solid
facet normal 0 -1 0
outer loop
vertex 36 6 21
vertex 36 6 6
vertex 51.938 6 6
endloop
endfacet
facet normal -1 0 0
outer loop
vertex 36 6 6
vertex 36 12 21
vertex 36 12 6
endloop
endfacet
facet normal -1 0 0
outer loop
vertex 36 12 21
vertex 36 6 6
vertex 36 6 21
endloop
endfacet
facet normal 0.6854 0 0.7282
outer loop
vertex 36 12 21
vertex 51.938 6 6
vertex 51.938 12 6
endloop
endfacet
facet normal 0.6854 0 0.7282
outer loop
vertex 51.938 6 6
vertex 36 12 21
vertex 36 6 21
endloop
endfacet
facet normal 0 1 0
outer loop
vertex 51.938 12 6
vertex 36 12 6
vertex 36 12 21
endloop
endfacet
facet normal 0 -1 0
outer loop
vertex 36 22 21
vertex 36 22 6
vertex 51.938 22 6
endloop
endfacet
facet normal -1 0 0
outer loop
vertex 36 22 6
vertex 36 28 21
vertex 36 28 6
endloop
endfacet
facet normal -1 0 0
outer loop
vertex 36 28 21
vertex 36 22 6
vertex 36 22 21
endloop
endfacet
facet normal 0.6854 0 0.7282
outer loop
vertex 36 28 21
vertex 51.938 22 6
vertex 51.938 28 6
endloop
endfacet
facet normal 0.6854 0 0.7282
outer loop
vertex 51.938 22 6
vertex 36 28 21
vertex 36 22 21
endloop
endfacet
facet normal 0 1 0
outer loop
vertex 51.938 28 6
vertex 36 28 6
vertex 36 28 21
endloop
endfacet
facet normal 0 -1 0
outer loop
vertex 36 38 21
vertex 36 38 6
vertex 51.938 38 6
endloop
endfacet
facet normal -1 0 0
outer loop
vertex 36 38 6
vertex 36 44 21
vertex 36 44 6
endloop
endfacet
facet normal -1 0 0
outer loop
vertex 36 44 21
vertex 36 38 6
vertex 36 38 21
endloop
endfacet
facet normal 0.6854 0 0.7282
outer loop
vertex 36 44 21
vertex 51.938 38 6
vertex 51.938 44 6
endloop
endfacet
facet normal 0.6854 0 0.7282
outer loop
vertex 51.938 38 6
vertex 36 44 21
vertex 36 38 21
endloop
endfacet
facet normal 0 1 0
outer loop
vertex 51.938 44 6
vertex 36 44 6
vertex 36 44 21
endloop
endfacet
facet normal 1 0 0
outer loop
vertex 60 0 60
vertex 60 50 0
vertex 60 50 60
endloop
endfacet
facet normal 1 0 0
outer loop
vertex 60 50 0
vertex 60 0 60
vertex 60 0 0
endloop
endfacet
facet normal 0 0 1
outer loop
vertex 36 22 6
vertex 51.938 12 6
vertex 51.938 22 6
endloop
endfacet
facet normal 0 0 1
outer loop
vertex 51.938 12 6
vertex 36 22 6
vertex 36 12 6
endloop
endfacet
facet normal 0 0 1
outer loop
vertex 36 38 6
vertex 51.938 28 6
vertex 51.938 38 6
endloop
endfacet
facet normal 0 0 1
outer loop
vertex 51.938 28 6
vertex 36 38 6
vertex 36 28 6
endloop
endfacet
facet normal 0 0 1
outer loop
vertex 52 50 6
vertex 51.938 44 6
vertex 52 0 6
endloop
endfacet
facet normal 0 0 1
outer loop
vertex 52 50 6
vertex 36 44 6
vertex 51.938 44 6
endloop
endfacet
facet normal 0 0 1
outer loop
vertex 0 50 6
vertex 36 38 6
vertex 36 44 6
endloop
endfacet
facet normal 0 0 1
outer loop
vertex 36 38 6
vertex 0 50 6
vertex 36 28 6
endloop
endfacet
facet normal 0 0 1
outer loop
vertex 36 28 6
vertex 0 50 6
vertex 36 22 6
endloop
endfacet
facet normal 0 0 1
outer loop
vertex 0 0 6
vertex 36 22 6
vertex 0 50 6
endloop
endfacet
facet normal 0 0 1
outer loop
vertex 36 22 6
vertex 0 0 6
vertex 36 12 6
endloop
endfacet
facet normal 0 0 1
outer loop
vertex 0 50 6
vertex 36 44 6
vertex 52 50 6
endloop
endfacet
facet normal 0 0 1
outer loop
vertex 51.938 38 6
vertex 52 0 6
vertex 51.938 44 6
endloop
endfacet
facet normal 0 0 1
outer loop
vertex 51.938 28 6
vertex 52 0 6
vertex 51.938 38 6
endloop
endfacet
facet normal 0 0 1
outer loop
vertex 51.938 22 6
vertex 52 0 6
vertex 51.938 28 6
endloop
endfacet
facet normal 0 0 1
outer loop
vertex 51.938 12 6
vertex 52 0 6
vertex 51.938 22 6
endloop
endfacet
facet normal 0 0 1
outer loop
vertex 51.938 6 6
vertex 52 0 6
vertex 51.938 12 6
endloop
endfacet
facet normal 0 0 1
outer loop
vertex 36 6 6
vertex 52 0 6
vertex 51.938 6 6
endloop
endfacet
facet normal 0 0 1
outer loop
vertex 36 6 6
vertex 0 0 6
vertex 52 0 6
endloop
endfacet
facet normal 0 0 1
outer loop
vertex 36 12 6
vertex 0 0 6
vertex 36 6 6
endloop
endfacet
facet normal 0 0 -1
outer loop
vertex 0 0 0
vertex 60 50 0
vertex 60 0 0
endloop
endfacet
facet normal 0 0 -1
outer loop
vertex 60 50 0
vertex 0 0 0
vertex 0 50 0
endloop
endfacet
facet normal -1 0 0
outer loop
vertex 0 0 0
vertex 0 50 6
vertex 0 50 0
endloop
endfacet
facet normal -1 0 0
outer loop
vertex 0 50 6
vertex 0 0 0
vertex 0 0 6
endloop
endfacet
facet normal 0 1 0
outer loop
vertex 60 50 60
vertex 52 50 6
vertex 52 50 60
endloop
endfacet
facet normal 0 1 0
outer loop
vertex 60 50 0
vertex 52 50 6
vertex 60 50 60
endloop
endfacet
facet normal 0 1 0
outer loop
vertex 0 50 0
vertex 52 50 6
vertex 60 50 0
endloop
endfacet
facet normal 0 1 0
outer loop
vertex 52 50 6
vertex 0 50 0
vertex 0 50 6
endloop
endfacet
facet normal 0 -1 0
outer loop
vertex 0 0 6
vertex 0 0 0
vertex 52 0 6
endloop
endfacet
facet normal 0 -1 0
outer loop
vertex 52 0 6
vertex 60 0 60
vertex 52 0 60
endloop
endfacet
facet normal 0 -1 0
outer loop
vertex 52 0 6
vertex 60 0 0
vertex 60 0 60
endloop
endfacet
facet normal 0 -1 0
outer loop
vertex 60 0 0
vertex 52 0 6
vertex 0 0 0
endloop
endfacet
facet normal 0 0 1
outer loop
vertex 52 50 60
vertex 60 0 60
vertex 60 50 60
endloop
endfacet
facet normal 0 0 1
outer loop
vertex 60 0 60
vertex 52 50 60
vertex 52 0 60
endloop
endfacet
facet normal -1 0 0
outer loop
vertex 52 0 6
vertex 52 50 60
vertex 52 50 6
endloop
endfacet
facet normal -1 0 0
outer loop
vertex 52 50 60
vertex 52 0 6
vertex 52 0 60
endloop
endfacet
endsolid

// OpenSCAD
$fn = 32;

// ----------------------------------------------------------------------
// Rib bracket: 3-gusset L bracket
// ----------------------------------------------------------------------

// --- parameters (mm) ---
base_l = 60;              // foot length, X
base_w = 50;              // foot width, Y
base_t = 6;               // foot thickness
plate_t = 8;              // upright plate thickness
plate_h = 60;             // overall height
gus_l = 16;               // gusset leg along the foot
gus_h = 16;               // gusset height
gus_t = 6;                // gusset thickness
gus_edge = 6;             // gusset margin from the foot edge
n_gus = 3;                // gusset count

gus_pitch = (base_w - 2 * gus_edge - gus_t) / (n_gus - 1);  // gusset pitch

union() {
  cube([base_l, base_w, base_t]);
  translate([base_l - plate_t, 0, base_t - 1])
    cube([plate_t, base_w, plate_h - base_t + 1]);
  for (i = [0 : n_gus - 1])
    translate([base_l - plate_t - gus_l, gus_edge + i * gus_pitch, base_t - 1])
      rotate([-90, 0, 0])
        linear_extrude(height = gus_t)
          polygon(points = [[0, 0], [gus_l + 1, 0], [0, -gus_h]]);
}
